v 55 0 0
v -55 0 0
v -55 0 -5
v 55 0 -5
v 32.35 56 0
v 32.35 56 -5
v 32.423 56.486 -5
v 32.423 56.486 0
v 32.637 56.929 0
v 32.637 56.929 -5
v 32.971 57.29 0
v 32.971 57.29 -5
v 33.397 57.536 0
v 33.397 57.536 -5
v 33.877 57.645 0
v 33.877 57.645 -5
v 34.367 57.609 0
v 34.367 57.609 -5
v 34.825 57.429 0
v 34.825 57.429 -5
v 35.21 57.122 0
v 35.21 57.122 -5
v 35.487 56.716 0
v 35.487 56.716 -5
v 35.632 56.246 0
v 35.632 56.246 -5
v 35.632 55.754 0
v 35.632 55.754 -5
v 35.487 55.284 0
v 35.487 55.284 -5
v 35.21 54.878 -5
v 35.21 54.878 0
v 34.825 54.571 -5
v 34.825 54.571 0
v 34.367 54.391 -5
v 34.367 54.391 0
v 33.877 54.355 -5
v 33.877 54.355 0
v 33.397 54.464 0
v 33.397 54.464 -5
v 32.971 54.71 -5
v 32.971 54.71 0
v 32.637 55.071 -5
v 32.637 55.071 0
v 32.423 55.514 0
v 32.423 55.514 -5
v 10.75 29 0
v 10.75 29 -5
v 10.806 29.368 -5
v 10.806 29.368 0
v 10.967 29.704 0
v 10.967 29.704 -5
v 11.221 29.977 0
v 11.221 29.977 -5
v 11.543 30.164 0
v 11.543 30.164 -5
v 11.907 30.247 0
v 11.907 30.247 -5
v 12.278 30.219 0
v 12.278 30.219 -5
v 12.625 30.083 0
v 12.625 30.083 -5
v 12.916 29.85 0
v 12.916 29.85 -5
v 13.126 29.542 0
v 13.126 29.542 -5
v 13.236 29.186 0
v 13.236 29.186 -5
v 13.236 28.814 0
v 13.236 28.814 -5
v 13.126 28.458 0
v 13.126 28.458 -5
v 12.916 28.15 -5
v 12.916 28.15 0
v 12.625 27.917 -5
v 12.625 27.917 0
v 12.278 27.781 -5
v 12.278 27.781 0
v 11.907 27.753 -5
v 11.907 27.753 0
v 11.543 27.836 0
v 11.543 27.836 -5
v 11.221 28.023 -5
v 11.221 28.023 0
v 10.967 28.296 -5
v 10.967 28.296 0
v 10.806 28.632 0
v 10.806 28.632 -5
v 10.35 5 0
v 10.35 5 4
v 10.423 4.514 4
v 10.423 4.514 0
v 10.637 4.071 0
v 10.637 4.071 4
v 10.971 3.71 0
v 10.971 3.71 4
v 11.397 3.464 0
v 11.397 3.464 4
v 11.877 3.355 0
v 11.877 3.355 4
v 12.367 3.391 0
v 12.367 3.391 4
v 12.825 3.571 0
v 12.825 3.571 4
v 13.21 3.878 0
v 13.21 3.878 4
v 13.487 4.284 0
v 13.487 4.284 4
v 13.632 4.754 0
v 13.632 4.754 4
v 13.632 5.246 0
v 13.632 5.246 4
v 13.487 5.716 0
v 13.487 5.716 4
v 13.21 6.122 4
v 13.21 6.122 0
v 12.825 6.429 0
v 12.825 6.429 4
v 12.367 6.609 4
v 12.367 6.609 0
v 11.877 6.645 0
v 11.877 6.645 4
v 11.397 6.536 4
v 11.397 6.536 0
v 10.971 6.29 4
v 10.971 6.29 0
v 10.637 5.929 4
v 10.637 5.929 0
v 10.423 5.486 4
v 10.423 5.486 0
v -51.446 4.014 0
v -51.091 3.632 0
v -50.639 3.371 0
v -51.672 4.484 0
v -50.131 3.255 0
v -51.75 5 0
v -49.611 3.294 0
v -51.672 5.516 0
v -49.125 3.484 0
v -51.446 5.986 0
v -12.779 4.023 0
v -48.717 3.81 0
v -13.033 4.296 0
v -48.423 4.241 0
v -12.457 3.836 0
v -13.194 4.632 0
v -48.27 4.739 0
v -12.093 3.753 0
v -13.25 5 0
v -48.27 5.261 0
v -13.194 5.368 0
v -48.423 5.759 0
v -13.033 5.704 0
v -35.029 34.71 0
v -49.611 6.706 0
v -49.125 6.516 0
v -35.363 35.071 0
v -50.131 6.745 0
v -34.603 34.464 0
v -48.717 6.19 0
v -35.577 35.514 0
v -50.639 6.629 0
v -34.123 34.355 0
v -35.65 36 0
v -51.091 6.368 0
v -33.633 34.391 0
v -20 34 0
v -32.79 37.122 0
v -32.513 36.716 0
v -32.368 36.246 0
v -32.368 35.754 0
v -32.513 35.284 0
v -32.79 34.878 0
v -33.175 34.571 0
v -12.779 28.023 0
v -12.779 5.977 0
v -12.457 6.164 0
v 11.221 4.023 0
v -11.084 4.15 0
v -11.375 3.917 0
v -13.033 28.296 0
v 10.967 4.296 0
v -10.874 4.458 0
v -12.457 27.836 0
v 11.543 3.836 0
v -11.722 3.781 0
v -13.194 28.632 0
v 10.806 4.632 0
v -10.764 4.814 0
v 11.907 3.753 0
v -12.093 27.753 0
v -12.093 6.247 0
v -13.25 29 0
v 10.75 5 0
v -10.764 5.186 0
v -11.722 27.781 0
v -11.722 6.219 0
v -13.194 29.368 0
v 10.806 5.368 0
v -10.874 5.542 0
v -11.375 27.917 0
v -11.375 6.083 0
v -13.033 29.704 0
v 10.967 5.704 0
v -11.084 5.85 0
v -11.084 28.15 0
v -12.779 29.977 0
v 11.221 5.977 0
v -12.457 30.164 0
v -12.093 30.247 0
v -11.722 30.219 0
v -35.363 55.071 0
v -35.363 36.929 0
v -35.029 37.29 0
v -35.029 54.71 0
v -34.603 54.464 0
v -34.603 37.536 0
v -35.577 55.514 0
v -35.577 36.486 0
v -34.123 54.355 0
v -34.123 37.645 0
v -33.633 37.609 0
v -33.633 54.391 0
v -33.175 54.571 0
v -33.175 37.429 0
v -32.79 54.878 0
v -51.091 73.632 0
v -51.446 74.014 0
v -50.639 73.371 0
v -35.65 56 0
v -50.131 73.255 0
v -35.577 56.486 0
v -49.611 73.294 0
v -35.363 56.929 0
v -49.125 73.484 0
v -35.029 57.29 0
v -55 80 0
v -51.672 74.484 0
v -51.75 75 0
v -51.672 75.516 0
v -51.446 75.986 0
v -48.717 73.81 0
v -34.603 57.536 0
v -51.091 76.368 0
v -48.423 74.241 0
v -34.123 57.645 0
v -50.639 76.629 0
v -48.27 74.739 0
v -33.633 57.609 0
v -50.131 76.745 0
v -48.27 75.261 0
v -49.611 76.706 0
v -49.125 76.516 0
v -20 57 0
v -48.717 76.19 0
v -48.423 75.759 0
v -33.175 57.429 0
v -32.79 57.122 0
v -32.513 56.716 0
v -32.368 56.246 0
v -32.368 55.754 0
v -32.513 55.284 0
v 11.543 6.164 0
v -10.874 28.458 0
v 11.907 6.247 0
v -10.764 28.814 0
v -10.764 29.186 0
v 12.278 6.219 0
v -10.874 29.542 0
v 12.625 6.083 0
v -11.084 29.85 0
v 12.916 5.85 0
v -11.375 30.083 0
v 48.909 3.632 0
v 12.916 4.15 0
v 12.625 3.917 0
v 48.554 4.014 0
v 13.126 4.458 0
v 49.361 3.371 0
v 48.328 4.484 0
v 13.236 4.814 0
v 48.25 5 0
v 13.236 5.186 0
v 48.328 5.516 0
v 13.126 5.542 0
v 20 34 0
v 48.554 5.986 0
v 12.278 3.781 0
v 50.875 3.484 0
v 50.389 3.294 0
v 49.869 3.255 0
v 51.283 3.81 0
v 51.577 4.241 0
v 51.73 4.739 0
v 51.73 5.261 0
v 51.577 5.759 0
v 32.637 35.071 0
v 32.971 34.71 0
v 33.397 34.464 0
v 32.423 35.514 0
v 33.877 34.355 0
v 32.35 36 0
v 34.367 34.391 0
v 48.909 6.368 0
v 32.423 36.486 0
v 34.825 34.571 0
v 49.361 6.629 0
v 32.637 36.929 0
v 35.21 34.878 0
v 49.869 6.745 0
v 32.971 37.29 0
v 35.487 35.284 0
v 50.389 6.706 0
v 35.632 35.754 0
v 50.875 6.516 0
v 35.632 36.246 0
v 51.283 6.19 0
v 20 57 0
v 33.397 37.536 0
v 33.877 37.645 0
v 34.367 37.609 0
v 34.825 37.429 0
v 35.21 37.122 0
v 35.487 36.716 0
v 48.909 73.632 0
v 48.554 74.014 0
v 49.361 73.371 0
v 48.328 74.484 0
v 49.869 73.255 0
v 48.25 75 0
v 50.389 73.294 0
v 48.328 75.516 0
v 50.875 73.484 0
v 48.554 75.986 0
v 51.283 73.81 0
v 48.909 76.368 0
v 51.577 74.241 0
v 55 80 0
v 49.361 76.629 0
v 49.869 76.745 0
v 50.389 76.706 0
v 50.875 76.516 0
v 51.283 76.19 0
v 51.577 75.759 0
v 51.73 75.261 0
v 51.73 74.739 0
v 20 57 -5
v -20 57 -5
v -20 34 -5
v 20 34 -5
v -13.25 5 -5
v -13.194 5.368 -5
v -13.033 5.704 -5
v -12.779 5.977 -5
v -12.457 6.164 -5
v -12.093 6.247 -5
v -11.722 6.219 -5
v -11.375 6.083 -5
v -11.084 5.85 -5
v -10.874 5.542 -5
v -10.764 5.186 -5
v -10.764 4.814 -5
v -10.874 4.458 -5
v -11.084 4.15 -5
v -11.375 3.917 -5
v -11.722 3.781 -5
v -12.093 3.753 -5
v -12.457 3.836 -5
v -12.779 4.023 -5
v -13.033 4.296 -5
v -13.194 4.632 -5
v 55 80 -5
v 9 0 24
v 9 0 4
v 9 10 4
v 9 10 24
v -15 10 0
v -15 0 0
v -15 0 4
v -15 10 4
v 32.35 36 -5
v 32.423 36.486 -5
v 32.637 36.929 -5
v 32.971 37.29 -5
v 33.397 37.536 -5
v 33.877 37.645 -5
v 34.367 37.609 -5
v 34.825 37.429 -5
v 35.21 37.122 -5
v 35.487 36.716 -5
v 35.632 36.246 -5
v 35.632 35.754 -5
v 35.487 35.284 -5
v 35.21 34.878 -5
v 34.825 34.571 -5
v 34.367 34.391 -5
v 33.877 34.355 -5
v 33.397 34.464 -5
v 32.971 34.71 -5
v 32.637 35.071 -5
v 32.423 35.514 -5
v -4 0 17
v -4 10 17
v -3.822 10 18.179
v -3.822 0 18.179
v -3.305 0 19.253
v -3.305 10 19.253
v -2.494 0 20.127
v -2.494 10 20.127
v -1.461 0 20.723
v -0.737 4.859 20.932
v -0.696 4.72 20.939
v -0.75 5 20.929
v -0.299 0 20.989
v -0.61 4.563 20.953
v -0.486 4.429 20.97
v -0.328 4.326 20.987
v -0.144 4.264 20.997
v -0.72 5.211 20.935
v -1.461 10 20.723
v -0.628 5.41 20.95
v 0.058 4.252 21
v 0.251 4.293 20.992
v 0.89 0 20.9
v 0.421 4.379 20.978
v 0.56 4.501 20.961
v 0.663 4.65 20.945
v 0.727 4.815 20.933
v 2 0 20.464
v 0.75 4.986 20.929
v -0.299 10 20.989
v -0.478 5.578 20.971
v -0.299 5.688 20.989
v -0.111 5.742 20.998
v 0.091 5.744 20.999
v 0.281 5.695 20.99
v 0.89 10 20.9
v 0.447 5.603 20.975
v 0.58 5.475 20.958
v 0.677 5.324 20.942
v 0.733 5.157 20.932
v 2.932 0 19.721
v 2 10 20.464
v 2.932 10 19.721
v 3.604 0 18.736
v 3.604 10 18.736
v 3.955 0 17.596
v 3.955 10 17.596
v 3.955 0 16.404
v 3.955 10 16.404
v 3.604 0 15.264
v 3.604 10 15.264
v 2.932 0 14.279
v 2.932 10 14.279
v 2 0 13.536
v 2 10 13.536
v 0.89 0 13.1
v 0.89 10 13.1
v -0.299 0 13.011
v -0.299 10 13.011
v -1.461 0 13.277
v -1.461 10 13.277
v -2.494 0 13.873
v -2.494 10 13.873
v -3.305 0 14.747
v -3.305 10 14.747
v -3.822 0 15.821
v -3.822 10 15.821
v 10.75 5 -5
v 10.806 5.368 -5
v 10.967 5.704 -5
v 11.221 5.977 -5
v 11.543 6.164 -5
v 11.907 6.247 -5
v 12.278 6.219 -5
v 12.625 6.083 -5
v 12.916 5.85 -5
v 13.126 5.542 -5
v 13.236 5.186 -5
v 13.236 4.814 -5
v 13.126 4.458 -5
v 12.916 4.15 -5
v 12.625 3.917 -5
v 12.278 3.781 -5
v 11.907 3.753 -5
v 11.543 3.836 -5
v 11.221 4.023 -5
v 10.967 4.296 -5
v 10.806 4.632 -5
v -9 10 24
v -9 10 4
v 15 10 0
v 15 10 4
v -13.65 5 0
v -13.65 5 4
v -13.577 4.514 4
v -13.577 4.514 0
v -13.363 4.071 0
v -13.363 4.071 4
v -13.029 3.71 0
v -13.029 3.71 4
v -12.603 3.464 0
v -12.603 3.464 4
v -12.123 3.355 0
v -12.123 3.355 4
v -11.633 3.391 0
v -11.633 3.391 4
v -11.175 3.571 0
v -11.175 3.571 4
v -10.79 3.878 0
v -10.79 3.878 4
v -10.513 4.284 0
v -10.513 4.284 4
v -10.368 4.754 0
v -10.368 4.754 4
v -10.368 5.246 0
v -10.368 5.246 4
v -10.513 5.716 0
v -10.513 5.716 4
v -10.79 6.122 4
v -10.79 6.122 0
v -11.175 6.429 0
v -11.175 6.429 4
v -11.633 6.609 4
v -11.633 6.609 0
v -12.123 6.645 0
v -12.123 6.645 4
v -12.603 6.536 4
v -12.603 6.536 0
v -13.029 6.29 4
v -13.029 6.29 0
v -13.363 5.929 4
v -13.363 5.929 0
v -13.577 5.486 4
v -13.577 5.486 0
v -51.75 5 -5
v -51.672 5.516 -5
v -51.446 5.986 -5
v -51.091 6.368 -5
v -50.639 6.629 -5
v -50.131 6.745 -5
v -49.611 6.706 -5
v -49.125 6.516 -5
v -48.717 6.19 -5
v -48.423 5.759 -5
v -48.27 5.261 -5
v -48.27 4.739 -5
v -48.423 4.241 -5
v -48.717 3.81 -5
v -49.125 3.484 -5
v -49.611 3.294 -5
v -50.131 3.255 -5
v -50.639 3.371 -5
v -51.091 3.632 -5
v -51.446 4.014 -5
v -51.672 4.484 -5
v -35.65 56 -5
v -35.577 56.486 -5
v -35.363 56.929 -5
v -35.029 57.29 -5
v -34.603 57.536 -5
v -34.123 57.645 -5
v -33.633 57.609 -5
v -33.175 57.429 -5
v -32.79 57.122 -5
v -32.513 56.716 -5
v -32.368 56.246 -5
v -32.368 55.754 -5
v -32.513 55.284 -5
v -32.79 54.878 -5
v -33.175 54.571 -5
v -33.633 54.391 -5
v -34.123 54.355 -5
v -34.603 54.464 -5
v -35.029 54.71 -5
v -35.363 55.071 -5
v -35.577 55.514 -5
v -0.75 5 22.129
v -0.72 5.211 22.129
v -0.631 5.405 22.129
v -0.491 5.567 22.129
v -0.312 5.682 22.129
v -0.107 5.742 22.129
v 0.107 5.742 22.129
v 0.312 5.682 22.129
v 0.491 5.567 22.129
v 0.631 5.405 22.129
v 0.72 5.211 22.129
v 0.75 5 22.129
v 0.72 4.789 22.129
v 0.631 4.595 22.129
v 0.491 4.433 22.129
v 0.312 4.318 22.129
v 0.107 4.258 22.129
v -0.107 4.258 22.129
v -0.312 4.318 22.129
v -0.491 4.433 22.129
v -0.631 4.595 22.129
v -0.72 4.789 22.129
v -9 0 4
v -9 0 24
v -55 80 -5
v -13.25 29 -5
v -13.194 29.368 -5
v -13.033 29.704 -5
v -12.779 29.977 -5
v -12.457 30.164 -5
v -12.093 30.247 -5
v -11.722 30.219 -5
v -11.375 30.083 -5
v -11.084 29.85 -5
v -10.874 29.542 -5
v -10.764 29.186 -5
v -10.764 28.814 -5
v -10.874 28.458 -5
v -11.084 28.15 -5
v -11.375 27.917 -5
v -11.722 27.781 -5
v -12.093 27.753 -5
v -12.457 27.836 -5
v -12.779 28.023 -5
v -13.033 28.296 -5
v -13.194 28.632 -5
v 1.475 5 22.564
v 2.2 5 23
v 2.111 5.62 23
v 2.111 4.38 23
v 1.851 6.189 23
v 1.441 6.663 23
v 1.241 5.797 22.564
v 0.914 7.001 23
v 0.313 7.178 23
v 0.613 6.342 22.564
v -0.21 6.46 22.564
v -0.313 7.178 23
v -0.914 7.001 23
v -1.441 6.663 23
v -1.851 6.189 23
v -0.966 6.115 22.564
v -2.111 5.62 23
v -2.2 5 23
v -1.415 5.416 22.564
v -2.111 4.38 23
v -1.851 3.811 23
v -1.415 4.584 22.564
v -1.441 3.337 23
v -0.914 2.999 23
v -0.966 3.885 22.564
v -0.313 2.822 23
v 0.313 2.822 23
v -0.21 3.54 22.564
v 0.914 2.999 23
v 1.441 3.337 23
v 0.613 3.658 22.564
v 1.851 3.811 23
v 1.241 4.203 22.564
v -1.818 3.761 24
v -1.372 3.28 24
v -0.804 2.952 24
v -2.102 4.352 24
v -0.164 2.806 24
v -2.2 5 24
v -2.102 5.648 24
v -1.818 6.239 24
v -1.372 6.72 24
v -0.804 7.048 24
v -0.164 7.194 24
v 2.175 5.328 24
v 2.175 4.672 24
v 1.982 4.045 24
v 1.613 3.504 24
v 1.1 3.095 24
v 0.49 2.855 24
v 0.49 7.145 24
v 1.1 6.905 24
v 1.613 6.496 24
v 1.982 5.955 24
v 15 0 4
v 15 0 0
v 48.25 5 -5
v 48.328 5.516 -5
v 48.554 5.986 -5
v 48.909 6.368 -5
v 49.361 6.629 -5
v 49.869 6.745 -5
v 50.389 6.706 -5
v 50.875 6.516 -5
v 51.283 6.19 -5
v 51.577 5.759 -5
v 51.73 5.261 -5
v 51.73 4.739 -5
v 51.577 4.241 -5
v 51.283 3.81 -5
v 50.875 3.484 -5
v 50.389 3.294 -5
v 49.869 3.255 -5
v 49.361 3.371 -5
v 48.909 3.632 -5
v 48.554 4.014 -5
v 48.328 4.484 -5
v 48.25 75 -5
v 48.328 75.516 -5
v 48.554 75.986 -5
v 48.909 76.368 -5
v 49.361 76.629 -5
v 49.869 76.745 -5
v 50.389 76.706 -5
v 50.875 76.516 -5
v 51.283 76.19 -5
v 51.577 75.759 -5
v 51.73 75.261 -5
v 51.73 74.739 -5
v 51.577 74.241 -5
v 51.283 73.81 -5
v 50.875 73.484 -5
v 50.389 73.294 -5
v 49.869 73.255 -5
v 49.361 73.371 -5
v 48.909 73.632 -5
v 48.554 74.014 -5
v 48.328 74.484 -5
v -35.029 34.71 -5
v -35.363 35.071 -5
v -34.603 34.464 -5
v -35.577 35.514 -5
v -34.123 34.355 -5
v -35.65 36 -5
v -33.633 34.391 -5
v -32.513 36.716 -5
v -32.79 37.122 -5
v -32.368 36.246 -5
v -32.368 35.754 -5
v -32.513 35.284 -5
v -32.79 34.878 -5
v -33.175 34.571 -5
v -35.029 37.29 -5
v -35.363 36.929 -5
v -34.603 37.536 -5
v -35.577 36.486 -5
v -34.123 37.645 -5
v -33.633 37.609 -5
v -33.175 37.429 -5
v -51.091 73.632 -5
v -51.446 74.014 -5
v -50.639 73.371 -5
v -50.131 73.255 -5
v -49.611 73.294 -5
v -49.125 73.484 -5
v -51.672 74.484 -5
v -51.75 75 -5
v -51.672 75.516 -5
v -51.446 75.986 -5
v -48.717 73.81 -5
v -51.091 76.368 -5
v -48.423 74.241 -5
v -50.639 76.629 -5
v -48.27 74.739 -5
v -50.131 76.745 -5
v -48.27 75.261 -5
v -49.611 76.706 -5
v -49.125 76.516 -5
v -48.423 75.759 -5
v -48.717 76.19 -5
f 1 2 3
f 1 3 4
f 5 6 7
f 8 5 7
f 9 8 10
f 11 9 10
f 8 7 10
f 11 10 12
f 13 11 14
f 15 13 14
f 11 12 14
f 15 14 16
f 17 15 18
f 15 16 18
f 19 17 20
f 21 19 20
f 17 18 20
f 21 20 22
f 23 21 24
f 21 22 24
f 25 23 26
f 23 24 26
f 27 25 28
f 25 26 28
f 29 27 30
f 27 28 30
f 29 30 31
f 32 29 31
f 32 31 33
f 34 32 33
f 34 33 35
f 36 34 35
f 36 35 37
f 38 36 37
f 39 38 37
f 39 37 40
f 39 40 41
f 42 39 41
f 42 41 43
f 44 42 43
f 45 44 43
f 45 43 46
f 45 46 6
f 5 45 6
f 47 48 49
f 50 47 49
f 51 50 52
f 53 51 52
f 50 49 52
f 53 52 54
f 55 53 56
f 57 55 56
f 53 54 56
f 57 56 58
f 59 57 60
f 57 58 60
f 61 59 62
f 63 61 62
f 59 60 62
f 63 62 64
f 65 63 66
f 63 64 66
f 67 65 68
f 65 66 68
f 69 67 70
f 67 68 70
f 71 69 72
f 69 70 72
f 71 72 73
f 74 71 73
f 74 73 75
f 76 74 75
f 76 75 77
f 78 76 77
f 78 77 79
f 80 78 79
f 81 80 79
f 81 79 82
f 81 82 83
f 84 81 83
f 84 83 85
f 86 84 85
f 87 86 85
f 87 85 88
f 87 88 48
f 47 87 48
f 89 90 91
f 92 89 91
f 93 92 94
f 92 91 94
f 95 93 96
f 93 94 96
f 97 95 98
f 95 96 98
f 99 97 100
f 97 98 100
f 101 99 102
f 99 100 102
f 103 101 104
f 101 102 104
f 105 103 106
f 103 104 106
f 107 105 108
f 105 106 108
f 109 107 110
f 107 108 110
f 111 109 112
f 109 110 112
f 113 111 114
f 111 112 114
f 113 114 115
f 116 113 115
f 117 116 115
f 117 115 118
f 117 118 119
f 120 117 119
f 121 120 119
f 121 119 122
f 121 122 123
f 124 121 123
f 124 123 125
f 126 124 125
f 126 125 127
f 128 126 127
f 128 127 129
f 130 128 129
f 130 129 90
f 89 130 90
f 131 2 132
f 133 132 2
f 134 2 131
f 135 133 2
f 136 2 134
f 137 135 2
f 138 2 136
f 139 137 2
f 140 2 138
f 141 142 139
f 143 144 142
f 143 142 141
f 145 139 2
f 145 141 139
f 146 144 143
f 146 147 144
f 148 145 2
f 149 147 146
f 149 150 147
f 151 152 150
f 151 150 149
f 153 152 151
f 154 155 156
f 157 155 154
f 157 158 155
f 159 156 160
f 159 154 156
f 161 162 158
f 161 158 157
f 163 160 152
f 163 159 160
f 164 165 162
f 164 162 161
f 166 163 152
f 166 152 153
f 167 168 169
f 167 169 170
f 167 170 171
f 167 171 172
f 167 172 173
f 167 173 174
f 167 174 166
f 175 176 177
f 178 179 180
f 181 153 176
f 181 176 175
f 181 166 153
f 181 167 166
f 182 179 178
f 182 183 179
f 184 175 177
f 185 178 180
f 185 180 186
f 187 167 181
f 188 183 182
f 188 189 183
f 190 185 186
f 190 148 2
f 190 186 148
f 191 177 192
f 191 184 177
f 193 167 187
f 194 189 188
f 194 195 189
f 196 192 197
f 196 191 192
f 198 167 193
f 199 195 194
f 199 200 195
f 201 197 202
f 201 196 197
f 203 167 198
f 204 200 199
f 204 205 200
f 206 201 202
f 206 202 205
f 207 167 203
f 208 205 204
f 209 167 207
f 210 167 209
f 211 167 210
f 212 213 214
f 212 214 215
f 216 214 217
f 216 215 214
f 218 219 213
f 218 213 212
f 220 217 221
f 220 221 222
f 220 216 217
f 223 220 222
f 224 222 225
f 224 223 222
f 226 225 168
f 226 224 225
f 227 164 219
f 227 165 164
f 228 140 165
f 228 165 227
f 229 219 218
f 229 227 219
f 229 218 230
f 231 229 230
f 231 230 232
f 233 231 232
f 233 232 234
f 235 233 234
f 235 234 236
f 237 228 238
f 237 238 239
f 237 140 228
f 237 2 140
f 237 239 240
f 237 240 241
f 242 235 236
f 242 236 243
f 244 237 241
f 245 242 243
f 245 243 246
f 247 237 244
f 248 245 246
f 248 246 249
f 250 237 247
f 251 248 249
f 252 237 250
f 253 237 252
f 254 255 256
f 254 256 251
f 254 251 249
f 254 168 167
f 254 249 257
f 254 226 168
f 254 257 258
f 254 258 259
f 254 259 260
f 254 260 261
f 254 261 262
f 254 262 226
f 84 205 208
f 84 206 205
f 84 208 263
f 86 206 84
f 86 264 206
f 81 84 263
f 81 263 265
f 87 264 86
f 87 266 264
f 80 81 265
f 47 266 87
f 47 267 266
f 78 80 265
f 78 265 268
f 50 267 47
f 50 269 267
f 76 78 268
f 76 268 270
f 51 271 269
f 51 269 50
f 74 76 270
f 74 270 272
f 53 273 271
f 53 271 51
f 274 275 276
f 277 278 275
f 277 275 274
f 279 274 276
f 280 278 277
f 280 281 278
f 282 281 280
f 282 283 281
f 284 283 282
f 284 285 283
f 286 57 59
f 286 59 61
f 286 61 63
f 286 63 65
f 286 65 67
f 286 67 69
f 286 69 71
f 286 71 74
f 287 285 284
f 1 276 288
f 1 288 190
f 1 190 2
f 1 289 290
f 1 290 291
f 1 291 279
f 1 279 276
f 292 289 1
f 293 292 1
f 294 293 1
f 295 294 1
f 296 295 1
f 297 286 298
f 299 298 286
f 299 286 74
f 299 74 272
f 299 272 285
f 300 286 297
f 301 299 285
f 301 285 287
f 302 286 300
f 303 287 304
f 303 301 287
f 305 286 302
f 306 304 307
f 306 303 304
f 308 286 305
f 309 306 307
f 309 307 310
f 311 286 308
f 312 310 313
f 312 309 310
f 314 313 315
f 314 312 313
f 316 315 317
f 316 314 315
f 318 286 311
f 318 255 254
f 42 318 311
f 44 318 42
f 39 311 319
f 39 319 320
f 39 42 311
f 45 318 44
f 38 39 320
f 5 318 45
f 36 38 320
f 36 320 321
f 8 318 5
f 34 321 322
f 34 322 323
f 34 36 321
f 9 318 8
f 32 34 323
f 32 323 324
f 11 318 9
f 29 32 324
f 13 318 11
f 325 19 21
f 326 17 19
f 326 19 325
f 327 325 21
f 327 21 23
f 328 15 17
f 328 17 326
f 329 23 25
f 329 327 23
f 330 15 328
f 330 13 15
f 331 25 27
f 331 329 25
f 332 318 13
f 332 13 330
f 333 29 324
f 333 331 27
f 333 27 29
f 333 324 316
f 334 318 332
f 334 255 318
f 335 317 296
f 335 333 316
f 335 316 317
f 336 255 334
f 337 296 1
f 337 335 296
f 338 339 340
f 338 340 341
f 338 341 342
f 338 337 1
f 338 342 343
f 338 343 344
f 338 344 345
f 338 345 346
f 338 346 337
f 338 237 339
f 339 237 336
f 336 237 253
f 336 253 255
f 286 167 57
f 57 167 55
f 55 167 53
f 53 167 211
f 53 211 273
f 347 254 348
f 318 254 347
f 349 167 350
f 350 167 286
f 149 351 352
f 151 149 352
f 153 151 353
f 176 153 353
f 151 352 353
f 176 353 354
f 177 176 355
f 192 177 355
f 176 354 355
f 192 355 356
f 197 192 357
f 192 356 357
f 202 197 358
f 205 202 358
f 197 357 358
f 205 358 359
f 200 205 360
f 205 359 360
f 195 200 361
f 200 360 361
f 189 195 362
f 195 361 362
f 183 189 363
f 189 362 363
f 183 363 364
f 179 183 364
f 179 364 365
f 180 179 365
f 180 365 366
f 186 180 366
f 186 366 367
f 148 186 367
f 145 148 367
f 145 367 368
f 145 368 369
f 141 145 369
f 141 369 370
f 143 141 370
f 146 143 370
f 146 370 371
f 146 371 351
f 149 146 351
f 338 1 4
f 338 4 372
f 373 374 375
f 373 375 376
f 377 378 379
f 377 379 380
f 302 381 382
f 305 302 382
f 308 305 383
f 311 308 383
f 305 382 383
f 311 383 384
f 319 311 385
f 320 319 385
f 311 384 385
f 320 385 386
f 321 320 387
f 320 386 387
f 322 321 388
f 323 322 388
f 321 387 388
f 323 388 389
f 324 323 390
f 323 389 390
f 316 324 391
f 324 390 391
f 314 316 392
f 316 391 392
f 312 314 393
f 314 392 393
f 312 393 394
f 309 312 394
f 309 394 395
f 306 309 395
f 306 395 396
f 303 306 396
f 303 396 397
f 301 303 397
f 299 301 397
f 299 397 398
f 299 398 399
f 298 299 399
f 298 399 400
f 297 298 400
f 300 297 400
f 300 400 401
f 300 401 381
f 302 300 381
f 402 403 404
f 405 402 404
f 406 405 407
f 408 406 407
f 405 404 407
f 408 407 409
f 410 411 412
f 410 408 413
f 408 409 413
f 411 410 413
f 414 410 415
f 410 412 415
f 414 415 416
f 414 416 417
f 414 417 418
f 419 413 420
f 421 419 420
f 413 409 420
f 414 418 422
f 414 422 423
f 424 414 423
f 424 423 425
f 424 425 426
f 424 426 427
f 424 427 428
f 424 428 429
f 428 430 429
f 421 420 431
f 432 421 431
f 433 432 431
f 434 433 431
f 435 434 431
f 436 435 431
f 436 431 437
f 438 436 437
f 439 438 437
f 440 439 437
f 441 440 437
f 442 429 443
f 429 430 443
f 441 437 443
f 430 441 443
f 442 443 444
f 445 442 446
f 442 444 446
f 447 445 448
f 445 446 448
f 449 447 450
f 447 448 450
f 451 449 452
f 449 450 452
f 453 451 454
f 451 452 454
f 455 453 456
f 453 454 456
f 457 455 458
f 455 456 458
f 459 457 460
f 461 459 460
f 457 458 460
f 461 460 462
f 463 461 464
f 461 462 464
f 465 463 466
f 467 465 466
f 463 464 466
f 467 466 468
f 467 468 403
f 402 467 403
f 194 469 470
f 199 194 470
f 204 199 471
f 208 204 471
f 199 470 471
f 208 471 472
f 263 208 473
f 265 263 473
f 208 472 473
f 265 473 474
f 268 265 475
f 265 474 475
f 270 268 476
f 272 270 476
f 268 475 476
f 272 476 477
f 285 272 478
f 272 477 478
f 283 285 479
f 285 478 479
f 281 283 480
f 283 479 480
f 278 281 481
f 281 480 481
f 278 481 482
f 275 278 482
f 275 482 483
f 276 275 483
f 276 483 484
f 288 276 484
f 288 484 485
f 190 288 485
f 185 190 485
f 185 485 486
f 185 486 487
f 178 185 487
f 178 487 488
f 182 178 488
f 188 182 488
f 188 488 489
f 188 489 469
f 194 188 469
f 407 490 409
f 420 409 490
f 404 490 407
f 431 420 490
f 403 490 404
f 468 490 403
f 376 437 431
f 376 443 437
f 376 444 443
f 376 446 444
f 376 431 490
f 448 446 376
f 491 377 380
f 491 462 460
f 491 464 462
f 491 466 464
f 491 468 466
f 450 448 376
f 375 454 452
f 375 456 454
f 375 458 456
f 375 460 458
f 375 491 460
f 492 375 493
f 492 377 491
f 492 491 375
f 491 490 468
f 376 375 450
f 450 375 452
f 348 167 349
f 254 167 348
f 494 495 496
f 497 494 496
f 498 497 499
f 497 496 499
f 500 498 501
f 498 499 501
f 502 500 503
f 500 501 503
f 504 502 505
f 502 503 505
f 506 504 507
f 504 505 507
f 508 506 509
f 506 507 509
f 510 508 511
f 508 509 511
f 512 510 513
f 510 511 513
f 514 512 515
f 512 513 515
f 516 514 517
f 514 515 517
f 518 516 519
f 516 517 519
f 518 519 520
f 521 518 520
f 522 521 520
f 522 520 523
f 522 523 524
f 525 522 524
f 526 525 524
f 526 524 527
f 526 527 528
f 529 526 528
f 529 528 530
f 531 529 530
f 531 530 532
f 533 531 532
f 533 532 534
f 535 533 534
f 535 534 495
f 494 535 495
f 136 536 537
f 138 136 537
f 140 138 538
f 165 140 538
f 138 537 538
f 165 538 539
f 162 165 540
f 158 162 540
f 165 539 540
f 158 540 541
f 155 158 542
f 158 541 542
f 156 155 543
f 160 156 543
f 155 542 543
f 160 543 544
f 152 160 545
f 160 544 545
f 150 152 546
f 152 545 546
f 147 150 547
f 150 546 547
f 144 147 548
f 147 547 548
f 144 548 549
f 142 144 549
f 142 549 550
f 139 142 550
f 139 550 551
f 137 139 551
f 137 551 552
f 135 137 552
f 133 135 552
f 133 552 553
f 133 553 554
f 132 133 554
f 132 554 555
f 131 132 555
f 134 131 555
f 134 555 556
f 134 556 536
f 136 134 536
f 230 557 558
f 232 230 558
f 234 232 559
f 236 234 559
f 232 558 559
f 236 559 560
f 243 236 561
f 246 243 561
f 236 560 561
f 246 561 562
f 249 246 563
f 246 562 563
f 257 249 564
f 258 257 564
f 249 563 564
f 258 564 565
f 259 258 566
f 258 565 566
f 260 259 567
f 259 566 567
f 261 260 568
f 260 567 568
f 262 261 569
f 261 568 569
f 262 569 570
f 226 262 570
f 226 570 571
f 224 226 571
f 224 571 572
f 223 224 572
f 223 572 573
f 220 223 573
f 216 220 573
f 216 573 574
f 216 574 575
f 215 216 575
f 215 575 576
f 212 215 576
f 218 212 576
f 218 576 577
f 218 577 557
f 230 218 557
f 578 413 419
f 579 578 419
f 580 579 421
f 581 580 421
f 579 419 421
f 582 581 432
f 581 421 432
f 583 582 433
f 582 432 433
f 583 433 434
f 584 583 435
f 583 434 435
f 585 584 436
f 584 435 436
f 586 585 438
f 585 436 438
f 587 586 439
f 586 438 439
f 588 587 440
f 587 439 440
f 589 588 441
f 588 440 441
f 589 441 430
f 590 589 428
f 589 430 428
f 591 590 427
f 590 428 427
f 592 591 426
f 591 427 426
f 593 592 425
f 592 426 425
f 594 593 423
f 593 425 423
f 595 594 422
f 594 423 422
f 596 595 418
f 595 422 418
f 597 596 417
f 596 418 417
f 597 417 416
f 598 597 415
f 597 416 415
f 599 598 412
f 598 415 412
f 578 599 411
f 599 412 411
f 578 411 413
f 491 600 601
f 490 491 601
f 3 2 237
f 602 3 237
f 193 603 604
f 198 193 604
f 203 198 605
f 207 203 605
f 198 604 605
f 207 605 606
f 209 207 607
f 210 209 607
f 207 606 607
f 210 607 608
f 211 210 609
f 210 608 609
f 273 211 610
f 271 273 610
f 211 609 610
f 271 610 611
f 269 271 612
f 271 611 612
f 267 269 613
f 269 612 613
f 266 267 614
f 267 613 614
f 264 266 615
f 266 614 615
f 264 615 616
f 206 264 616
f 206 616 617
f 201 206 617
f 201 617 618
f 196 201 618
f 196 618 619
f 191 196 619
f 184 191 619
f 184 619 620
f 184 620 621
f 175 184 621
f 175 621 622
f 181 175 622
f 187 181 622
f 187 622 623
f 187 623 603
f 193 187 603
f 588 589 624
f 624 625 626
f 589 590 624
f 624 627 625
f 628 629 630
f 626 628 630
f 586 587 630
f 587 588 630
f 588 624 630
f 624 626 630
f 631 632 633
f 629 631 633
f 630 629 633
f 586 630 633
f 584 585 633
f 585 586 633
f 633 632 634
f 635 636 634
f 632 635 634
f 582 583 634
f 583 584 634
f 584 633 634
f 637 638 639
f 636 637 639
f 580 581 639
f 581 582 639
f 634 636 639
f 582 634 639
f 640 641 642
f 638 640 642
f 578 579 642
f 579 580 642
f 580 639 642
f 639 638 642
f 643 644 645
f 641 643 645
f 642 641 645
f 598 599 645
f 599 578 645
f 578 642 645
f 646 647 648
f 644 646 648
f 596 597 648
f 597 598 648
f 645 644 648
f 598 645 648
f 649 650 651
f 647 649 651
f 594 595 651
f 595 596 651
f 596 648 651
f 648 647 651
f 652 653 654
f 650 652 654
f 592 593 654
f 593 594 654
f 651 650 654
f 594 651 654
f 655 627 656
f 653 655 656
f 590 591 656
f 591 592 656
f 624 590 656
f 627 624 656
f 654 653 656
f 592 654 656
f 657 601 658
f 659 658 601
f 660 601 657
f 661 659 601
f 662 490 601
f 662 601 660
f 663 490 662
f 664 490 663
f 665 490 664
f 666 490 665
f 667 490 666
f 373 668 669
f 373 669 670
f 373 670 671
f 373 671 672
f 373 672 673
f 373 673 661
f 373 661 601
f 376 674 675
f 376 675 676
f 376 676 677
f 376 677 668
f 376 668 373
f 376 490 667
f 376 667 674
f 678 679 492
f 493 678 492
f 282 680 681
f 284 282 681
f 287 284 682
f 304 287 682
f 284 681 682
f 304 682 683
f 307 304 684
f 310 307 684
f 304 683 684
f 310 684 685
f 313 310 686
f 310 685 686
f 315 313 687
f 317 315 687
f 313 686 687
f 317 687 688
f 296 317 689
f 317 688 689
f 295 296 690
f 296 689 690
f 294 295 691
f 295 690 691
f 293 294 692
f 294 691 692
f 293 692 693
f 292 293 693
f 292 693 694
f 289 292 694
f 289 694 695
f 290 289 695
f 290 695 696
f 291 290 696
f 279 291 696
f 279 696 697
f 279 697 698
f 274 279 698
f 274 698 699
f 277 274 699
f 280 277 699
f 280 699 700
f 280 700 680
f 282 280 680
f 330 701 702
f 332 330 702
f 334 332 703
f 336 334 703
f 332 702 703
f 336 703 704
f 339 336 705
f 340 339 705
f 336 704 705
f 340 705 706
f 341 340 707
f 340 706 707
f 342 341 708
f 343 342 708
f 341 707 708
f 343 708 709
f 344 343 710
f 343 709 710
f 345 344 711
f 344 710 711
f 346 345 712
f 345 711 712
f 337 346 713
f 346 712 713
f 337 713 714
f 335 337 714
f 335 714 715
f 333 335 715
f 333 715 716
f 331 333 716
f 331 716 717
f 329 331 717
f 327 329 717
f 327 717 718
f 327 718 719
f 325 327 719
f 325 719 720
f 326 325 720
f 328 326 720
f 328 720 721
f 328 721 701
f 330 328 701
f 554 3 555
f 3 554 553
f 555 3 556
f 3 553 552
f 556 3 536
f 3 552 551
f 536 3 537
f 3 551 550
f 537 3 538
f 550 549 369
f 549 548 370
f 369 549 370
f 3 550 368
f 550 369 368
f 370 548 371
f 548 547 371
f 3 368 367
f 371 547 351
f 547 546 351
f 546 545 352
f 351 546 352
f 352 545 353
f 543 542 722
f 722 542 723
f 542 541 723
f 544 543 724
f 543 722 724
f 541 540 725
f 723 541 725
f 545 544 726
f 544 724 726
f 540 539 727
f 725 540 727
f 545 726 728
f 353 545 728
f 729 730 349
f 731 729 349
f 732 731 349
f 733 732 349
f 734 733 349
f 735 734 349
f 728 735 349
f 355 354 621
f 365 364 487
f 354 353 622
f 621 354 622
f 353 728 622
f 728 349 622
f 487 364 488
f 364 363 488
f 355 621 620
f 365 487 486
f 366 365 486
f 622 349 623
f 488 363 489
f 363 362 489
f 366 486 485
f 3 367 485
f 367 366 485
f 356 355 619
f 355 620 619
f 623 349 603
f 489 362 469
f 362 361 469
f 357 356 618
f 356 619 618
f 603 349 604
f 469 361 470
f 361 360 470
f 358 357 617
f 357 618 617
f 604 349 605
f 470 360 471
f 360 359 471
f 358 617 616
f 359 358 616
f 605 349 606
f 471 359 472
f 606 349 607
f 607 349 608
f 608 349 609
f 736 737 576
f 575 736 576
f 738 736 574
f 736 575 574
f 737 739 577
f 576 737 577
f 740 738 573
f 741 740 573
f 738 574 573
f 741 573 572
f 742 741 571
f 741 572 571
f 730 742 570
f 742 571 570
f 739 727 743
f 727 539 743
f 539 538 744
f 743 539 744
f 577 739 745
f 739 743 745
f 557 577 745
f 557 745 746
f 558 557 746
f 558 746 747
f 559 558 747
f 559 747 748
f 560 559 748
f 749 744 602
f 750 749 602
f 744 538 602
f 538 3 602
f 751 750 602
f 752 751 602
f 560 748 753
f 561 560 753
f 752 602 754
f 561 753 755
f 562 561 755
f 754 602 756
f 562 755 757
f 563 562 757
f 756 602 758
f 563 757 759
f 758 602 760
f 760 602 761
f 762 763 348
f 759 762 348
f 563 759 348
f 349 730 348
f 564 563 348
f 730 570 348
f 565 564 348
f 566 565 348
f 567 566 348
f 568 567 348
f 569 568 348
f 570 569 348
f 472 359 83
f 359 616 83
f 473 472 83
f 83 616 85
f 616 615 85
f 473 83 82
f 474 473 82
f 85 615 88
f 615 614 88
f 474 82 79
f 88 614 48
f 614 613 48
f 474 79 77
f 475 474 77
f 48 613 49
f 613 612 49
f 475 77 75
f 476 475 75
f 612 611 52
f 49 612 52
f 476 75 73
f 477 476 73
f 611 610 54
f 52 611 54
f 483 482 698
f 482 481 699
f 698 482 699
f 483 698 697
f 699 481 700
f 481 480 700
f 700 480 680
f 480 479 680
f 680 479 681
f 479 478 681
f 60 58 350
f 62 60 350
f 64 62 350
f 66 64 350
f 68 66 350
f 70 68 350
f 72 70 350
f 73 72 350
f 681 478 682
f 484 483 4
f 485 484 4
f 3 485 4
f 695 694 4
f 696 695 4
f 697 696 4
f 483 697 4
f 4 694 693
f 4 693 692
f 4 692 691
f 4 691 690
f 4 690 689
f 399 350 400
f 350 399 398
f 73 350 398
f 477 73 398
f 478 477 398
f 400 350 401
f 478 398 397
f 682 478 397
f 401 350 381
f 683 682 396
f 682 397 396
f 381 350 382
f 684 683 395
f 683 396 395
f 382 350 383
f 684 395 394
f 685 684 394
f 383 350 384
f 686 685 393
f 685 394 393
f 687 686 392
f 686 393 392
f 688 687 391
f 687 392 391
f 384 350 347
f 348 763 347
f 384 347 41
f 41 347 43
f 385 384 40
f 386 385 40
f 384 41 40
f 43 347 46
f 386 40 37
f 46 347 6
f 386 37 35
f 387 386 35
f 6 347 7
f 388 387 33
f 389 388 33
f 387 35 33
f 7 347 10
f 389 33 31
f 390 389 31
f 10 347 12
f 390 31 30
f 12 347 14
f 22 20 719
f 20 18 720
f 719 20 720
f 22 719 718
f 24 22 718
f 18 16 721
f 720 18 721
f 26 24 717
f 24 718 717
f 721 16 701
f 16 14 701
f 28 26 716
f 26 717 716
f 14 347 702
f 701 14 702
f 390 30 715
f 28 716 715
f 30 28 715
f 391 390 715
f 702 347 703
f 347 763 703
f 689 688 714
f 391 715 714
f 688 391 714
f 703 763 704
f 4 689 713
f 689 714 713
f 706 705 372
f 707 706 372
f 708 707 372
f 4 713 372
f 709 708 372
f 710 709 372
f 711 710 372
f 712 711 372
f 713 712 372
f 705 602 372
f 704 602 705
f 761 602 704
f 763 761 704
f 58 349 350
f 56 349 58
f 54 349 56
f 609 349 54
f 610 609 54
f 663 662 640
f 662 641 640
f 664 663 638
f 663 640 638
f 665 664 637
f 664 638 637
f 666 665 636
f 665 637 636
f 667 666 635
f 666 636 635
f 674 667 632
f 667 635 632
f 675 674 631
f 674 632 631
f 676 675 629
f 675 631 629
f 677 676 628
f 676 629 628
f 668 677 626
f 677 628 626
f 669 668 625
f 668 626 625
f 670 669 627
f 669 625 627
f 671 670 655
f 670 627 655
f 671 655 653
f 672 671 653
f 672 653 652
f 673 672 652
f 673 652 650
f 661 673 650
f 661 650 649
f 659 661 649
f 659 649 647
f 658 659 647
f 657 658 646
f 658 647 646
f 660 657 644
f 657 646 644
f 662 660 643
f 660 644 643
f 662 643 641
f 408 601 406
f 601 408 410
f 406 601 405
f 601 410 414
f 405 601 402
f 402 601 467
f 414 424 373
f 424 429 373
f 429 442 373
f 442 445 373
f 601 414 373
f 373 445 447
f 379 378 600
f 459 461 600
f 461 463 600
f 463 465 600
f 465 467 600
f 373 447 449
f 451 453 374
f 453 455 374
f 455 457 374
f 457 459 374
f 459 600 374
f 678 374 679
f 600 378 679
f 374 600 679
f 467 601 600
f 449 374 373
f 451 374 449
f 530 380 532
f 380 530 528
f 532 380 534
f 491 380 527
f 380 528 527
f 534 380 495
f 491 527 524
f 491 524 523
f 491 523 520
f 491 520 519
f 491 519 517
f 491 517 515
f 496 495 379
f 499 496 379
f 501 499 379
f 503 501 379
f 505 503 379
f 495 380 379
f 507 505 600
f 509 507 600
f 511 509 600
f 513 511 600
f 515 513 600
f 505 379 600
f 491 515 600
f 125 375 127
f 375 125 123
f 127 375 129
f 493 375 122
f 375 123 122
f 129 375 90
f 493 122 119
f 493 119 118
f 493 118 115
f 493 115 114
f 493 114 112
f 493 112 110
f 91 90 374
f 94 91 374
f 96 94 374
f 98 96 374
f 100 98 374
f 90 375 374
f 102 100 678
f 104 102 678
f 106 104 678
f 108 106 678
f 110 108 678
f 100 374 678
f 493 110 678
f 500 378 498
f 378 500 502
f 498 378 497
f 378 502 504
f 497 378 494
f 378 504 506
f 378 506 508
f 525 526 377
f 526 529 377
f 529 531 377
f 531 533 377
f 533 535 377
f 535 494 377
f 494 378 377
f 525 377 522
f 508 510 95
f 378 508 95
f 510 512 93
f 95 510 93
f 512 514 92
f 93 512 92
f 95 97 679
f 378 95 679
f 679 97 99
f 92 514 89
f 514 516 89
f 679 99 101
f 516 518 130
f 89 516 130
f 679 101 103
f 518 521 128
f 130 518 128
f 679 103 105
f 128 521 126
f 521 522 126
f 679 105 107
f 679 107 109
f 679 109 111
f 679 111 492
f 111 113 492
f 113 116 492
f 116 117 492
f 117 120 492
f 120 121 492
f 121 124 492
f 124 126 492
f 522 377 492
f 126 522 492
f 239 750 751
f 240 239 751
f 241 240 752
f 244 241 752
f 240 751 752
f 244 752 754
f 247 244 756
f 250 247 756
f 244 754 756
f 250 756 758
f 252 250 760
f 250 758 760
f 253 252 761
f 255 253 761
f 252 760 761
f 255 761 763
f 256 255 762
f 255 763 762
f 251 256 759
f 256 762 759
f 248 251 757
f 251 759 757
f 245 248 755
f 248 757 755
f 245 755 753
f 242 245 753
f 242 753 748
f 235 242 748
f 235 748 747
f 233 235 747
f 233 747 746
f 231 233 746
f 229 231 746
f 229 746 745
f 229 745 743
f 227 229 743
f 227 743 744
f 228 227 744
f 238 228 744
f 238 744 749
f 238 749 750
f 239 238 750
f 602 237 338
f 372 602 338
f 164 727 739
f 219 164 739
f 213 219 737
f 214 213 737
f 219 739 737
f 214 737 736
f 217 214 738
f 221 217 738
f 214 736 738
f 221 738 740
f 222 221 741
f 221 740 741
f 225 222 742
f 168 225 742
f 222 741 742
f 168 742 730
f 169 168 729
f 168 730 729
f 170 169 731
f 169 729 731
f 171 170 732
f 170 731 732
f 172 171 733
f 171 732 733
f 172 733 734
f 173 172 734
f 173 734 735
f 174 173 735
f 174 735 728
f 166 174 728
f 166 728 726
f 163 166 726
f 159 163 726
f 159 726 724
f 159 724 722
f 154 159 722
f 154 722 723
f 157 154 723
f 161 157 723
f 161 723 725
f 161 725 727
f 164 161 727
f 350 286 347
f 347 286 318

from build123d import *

# Parameters (mm, degrees)
F0_W      = 110
F0_H      = 80
F1_DEPTH  = 5
F2_W      = 40
F2_H      = 23
F3_DEPTH  = 5.001
F5_D      = 2.5
F6_D      = 3.3
F8_D      = 3.5
F9_W      = 30
F9_H      = 10
F10_DEPTH = 24
F11_W     = 6
F11_H     = 20
F12_DEPTH = 80.001
F13_D     = 3.3
F14_D     = 8
F16_D     = 1.5
F16_DEPTH = 7.5
F16_TIP   = 0.4506454643
F17_D     = 4.4
F17_DEPTH = 1
F17_TIP   = 1.3218933619


with BuildPart() as f1:
    # F0 (on Top) → F1 (new body)
    with BuildSketch(Plane.XY):
        with Locations((0, 40)):
            Rectangle(F0_W, F0_H)
    extrude(amount=-F1_DEPTH)

    # F2 (on face) → F3 (cut, through all)
    with BuildSketch(Plane.XY):
        with Locations((0, 45.5)):
            Rectangle(F2_W, F2_H)
    extrude(amount=-F3_DEPTH, mode=Mode.SUBTRACT)

    # F5 (through all)
    with Locations(Plane.XY):
        with Locations((-12, 5), (12, 5), (12, 29), (-12, 29)):
            Hole(F5_D / 2)

    # F6 (through all)
    with Locations(Plane.XY):
        with Locations((-34, 36), (34, 36), (34, 56), (-34, 56)):
            Hole(F6_D / 2)

    # F8 (through all)
    with Locations(Plane.XY):
        with Locations((-50, 5), (50, 5), (50, 75), (-50, 75)):
            Hole(F8_D / 2)


with BuildPart() as f10:
    # F9 (on face) → F10 (new body)
    with BuildSketch(Plane.XY):
        with Locations((0, 5)):
            Rectangle(F9_W, F9_H)
    extrude(amount=F10_DEPTH)

    # F11 (on face) → F12 (cut, through all)
    with BuildSketch(Plane.XZ):
        with Locations((12, 14)):
            Rectangle(F11_W, F11_H)
        with Locations((-12, 14)):
            Rectangle(F11_W, F11_H)
    extrude(amount=-F12_DEPTH, mode=Mode.SUBTRACT)

    # F13 (through all)
    with Locations(Plane(origin=(0, 0, 0), x_dir=(1, 0, 0), z_dir=(0, 0, -1))):
        with Locations((-12, -5), (12, -5)):
            Hole(F13_D / 2)

    # F14 (through all)
    with Locations(Plane.XZ):
        with Locations((0, 17)):
            Hole(F14_D / 2)

    # F16
    with Locations(Plane.XY.offset(24)):
        with Locations((0, 5)):
            Hole(F16_D / 2, depth=F16_DEPTH)
            with Locations((0, 0, -(F16_DEPTH + F16_TIP / 2))):  # 118° drill point
                Cone(0, F16_D / 2, F16_TIP, mode=Mode.SUBTRACT)

    # F17
    with Locations(Plane.XY.offset(24)):
        with Locations((0, 5)):
            Hole(F17_D / 2, depth=F17_DEPTH)
            with Locations((0, 0, -(F17_DEPTH + F17_TIP / 2))):  # 118° drill point
                Cone(0, F17_D / 2, F17_TIP, mode=Mode.SUBTRACT)


solid = Compound([f1.part, f10.part])
